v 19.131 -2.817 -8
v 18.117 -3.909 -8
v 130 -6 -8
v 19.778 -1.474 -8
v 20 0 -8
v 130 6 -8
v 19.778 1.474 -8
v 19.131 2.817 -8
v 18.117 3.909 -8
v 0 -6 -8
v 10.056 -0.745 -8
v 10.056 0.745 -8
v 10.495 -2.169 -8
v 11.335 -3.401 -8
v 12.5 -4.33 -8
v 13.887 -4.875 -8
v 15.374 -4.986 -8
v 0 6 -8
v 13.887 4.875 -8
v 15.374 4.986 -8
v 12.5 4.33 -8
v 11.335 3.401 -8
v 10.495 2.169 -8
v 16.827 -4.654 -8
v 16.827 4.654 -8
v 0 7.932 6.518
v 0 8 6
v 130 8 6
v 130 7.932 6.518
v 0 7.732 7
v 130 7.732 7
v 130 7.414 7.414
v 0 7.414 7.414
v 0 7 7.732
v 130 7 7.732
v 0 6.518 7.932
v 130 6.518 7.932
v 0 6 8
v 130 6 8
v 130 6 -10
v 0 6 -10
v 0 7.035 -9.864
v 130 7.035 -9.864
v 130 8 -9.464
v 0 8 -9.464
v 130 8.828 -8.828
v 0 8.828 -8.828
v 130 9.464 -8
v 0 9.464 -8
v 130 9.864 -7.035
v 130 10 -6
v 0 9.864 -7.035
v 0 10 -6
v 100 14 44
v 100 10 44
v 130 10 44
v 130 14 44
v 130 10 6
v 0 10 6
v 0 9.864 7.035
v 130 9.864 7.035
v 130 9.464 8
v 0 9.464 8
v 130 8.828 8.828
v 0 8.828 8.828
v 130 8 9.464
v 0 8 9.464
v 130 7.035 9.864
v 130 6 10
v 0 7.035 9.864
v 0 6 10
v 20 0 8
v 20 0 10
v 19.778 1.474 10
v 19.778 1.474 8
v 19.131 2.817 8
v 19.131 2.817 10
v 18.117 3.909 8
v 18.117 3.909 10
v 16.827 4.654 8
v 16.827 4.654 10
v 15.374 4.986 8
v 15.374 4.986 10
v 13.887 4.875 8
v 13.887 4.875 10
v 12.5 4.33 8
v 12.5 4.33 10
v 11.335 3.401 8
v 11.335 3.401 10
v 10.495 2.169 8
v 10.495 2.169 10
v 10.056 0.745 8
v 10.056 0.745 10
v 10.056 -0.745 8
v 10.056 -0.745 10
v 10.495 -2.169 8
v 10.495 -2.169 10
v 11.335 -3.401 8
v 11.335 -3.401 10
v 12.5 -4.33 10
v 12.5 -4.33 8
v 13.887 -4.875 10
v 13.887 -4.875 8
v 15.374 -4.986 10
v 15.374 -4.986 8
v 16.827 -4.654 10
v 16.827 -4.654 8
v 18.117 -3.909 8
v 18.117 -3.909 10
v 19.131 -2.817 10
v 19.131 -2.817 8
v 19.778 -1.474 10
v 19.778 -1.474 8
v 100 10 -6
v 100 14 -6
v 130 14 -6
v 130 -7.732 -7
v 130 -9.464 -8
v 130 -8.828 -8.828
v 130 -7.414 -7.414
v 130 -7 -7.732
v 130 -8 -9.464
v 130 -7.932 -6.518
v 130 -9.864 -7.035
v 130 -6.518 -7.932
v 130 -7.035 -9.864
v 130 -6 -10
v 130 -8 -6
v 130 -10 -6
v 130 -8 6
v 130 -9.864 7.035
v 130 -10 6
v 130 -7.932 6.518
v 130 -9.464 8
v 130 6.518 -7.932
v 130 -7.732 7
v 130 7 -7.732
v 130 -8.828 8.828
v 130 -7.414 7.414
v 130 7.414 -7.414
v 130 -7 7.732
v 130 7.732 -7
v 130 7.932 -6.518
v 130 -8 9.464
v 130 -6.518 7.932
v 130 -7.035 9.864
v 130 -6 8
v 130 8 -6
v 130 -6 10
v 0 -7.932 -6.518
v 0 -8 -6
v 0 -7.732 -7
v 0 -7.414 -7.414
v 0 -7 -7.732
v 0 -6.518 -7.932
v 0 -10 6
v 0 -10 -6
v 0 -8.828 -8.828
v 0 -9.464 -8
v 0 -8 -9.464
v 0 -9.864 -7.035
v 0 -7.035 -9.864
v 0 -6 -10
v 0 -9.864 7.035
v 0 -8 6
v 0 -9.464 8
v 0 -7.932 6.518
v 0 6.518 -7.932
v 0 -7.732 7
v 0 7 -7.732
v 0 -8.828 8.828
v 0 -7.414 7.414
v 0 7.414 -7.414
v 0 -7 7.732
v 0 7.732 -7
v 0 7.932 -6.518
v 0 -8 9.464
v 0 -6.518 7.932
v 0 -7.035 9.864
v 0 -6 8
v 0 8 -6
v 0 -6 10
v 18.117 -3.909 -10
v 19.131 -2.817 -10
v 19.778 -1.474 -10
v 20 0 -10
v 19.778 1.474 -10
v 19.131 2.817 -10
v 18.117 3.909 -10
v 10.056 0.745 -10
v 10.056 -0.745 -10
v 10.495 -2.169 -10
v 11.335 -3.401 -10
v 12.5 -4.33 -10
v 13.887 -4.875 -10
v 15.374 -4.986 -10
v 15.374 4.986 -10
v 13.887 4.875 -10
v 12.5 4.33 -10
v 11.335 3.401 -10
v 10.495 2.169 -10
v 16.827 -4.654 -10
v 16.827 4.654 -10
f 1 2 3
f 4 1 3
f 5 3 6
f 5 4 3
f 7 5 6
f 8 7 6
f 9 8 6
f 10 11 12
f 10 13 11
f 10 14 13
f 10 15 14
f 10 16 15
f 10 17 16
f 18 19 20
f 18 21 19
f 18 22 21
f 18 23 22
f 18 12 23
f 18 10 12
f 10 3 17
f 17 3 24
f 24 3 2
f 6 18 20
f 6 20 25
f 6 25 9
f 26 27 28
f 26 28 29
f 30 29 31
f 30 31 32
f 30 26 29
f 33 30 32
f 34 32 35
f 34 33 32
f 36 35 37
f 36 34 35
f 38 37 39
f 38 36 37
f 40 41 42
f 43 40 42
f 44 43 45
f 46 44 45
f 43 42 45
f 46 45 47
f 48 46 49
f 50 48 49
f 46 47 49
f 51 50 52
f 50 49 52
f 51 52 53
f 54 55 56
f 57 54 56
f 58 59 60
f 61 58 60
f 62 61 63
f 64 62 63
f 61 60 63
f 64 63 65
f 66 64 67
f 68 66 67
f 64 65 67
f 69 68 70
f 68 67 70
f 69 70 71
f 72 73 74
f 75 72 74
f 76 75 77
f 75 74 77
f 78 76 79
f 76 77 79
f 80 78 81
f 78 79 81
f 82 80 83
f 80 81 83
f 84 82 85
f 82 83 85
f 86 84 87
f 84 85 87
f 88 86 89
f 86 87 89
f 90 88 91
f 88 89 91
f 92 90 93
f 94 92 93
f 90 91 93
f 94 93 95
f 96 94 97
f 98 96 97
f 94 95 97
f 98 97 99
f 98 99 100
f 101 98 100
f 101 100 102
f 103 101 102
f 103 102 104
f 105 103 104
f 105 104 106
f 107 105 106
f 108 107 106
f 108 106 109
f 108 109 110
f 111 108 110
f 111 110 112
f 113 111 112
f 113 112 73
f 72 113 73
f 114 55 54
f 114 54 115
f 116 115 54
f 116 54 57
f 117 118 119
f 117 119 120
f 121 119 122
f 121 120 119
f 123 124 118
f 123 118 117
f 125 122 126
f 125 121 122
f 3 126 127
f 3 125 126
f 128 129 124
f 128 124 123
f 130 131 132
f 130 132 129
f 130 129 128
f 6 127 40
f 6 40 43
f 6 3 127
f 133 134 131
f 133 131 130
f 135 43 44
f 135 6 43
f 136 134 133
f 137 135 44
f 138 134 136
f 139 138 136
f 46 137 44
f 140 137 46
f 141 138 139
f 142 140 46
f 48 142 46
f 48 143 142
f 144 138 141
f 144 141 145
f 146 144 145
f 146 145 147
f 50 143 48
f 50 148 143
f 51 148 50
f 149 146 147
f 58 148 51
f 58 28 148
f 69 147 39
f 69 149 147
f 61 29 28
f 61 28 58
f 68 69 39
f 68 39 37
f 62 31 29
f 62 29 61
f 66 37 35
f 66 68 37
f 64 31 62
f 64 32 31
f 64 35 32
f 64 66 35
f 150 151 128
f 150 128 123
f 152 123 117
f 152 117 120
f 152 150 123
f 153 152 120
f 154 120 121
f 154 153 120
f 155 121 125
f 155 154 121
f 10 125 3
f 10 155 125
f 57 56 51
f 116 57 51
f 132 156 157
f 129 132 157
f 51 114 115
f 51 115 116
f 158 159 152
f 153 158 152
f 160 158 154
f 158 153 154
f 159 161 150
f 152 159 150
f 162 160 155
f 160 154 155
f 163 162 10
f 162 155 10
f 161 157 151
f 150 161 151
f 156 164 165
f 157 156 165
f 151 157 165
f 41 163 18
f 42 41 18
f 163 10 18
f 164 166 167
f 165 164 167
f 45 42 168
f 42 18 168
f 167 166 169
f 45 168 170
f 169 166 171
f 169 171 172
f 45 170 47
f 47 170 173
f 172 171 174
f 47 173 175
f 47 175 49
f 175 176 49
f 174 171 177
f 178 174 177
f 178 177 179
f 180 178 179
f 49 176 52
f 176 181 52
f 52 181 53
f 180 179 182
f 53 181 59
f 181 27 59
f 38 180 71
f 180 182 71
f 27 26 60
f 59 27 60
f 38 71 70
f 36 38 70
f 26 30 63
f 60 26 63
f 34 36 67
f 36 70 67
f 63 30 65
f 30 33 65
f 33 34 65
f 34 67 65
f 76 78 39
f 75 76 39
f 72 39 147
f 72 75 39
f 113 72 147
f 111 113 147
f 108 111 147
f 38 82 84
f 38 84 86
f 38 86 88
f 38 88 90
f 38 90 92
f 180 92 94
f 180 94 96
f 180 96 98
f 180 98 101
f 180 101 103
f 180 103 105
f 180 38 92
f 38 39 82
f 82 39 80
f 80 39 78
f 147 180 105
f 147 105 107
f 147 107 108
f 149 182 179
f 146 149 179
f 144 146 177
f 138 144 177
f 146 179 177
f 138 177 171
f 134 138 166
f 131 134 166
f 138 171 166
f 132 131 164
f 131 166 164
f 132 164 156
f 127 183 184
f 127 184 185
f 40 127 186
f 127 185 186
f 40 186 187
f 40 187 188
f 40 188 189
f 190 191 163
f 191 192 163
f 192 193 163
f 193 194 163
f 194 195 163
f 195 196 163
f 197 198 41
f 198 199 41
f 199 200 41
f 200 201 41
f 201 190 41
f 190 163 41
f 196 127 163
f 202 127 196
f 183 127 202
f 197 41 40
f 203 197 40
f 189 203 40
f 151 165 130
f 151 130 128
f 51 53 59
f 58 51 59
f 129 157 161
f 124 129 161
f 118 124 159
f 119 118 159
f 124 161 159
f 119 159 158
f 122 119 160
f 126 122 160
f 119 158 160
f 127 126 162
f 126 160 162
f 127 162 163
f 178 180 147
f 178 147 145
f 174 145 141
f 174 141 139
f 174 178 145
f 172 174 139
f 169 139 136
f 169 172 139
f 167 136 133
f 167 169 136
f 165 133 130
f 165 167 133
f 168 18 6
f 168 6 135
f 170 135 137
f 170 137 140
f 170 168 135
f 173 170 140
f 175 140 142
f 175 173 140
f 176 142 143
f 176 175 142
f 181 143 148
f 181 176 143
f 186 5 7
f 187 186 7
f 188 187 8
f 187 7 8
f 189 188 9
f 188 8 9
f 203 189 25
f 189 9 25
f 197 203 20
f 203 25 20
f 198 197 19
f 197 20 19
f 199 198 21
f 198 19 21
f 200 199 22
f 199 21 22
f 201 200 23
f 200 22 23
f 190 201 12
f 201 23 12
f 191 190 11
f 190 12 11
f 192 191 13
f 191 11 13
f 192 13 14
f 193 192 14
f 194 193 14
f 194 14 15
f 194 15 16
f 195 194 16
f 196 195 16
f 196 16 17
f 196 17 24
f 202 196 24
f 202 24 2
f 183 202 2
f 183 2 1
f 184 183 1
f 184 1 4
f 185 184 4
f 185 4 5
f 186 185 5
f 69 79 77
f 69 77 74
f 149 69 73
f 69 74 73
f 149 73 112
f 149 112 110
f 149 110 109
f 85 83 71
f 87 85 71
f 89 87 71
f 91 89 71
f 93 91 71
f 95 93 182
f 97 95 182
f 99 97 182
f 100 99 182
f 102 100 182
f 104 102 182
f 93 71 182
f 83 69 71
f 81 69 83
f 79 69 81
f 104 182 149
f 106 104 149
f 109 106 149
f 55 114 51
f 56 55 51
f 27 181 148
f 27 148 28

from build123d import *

# Parameters (mm, degrees)
STRUCTURAL_MEMBER1_DEPTH = 130
SKETCH12_R               = 5
CUT_EXTRUDE1_DEPTH       = 35
SKETCH13_W               = 30
SKETCH13_H               = 50
BOSS_EXTRUDE1_DEPTH      = 4


with BuildPart() as part:
    # Sketch11 → Structural Member1 (new body)
    with BuildSketch(Plane.YZ):
        with BuildLine():
            Line((-6, -10), (6, -10))
            ThreePointArc((6, -10), (8.828427125, -8.828427125), (10, -6))
            Line((10, -6), (10, 6))
            ThreePointArc((10, 6), (8.828427125, 8.828427125), (6, 10))
            Line((6, 10), (-6, 10))
            ThreePointArc((-6, 10), (-8.828427125, 8.828427125), (-10, 6))
            Line((-10, 6), (-10, -6))
            ThreePointArc((-10, -6), (-8.828427125, -8.828427125), (-6, -10))
        make_face()
        with BuildLine():
            Line((-6, -8), (6, -8))
            ThreePointArc((6, -8), (7.414213562, -7.414213562), (8, -6))
            Line((8, -6), (8, 6))
            ThreePointArc((8, 6), (7.414213562, 7.414213562), (6, 8))
            Line((6, 8), (-6, 8))
            ThreePointArc((-6, 8), (-7.414213562, 7.414213562), (-8, 6))
            Line((-8, 6), (-8, -6))
            ThreePointArc((-8, -6), (-7.414213562, -7.414213562), (-6, -8))
        make_face(mode=Mode.SUBTRACT)
    extrude(amount=STRUCTURAL_MEMBER1_DEPTH)

    # Sketch12 → Cut-Extrude1 (cut)
    with BuildSketch(Plane.XY.offset(10)):
        with Locations((15, 0)):
            Circle(SKETCH12_R)
    extrude(amount=-CUT_EXTRUDE1_DEPTH, mode=Mode.SUBTRACT)


with BuildPart() as body_2:
    # Sketch13 → Boss-Extrude1 (new body)
    with BuildSketch(Plane(origin=(0, 10, 0), x_dir=(1, 0, 0), z_dir=(0, 1, 0))):
        with Locations((115, -19)):
            Rectangle(SKETCH13_W, SKETCH13_H)
    extrude(amount=BOSS_EXTRUDE1_DEPTH)


solid = Compound([part.part, body_2.part])
